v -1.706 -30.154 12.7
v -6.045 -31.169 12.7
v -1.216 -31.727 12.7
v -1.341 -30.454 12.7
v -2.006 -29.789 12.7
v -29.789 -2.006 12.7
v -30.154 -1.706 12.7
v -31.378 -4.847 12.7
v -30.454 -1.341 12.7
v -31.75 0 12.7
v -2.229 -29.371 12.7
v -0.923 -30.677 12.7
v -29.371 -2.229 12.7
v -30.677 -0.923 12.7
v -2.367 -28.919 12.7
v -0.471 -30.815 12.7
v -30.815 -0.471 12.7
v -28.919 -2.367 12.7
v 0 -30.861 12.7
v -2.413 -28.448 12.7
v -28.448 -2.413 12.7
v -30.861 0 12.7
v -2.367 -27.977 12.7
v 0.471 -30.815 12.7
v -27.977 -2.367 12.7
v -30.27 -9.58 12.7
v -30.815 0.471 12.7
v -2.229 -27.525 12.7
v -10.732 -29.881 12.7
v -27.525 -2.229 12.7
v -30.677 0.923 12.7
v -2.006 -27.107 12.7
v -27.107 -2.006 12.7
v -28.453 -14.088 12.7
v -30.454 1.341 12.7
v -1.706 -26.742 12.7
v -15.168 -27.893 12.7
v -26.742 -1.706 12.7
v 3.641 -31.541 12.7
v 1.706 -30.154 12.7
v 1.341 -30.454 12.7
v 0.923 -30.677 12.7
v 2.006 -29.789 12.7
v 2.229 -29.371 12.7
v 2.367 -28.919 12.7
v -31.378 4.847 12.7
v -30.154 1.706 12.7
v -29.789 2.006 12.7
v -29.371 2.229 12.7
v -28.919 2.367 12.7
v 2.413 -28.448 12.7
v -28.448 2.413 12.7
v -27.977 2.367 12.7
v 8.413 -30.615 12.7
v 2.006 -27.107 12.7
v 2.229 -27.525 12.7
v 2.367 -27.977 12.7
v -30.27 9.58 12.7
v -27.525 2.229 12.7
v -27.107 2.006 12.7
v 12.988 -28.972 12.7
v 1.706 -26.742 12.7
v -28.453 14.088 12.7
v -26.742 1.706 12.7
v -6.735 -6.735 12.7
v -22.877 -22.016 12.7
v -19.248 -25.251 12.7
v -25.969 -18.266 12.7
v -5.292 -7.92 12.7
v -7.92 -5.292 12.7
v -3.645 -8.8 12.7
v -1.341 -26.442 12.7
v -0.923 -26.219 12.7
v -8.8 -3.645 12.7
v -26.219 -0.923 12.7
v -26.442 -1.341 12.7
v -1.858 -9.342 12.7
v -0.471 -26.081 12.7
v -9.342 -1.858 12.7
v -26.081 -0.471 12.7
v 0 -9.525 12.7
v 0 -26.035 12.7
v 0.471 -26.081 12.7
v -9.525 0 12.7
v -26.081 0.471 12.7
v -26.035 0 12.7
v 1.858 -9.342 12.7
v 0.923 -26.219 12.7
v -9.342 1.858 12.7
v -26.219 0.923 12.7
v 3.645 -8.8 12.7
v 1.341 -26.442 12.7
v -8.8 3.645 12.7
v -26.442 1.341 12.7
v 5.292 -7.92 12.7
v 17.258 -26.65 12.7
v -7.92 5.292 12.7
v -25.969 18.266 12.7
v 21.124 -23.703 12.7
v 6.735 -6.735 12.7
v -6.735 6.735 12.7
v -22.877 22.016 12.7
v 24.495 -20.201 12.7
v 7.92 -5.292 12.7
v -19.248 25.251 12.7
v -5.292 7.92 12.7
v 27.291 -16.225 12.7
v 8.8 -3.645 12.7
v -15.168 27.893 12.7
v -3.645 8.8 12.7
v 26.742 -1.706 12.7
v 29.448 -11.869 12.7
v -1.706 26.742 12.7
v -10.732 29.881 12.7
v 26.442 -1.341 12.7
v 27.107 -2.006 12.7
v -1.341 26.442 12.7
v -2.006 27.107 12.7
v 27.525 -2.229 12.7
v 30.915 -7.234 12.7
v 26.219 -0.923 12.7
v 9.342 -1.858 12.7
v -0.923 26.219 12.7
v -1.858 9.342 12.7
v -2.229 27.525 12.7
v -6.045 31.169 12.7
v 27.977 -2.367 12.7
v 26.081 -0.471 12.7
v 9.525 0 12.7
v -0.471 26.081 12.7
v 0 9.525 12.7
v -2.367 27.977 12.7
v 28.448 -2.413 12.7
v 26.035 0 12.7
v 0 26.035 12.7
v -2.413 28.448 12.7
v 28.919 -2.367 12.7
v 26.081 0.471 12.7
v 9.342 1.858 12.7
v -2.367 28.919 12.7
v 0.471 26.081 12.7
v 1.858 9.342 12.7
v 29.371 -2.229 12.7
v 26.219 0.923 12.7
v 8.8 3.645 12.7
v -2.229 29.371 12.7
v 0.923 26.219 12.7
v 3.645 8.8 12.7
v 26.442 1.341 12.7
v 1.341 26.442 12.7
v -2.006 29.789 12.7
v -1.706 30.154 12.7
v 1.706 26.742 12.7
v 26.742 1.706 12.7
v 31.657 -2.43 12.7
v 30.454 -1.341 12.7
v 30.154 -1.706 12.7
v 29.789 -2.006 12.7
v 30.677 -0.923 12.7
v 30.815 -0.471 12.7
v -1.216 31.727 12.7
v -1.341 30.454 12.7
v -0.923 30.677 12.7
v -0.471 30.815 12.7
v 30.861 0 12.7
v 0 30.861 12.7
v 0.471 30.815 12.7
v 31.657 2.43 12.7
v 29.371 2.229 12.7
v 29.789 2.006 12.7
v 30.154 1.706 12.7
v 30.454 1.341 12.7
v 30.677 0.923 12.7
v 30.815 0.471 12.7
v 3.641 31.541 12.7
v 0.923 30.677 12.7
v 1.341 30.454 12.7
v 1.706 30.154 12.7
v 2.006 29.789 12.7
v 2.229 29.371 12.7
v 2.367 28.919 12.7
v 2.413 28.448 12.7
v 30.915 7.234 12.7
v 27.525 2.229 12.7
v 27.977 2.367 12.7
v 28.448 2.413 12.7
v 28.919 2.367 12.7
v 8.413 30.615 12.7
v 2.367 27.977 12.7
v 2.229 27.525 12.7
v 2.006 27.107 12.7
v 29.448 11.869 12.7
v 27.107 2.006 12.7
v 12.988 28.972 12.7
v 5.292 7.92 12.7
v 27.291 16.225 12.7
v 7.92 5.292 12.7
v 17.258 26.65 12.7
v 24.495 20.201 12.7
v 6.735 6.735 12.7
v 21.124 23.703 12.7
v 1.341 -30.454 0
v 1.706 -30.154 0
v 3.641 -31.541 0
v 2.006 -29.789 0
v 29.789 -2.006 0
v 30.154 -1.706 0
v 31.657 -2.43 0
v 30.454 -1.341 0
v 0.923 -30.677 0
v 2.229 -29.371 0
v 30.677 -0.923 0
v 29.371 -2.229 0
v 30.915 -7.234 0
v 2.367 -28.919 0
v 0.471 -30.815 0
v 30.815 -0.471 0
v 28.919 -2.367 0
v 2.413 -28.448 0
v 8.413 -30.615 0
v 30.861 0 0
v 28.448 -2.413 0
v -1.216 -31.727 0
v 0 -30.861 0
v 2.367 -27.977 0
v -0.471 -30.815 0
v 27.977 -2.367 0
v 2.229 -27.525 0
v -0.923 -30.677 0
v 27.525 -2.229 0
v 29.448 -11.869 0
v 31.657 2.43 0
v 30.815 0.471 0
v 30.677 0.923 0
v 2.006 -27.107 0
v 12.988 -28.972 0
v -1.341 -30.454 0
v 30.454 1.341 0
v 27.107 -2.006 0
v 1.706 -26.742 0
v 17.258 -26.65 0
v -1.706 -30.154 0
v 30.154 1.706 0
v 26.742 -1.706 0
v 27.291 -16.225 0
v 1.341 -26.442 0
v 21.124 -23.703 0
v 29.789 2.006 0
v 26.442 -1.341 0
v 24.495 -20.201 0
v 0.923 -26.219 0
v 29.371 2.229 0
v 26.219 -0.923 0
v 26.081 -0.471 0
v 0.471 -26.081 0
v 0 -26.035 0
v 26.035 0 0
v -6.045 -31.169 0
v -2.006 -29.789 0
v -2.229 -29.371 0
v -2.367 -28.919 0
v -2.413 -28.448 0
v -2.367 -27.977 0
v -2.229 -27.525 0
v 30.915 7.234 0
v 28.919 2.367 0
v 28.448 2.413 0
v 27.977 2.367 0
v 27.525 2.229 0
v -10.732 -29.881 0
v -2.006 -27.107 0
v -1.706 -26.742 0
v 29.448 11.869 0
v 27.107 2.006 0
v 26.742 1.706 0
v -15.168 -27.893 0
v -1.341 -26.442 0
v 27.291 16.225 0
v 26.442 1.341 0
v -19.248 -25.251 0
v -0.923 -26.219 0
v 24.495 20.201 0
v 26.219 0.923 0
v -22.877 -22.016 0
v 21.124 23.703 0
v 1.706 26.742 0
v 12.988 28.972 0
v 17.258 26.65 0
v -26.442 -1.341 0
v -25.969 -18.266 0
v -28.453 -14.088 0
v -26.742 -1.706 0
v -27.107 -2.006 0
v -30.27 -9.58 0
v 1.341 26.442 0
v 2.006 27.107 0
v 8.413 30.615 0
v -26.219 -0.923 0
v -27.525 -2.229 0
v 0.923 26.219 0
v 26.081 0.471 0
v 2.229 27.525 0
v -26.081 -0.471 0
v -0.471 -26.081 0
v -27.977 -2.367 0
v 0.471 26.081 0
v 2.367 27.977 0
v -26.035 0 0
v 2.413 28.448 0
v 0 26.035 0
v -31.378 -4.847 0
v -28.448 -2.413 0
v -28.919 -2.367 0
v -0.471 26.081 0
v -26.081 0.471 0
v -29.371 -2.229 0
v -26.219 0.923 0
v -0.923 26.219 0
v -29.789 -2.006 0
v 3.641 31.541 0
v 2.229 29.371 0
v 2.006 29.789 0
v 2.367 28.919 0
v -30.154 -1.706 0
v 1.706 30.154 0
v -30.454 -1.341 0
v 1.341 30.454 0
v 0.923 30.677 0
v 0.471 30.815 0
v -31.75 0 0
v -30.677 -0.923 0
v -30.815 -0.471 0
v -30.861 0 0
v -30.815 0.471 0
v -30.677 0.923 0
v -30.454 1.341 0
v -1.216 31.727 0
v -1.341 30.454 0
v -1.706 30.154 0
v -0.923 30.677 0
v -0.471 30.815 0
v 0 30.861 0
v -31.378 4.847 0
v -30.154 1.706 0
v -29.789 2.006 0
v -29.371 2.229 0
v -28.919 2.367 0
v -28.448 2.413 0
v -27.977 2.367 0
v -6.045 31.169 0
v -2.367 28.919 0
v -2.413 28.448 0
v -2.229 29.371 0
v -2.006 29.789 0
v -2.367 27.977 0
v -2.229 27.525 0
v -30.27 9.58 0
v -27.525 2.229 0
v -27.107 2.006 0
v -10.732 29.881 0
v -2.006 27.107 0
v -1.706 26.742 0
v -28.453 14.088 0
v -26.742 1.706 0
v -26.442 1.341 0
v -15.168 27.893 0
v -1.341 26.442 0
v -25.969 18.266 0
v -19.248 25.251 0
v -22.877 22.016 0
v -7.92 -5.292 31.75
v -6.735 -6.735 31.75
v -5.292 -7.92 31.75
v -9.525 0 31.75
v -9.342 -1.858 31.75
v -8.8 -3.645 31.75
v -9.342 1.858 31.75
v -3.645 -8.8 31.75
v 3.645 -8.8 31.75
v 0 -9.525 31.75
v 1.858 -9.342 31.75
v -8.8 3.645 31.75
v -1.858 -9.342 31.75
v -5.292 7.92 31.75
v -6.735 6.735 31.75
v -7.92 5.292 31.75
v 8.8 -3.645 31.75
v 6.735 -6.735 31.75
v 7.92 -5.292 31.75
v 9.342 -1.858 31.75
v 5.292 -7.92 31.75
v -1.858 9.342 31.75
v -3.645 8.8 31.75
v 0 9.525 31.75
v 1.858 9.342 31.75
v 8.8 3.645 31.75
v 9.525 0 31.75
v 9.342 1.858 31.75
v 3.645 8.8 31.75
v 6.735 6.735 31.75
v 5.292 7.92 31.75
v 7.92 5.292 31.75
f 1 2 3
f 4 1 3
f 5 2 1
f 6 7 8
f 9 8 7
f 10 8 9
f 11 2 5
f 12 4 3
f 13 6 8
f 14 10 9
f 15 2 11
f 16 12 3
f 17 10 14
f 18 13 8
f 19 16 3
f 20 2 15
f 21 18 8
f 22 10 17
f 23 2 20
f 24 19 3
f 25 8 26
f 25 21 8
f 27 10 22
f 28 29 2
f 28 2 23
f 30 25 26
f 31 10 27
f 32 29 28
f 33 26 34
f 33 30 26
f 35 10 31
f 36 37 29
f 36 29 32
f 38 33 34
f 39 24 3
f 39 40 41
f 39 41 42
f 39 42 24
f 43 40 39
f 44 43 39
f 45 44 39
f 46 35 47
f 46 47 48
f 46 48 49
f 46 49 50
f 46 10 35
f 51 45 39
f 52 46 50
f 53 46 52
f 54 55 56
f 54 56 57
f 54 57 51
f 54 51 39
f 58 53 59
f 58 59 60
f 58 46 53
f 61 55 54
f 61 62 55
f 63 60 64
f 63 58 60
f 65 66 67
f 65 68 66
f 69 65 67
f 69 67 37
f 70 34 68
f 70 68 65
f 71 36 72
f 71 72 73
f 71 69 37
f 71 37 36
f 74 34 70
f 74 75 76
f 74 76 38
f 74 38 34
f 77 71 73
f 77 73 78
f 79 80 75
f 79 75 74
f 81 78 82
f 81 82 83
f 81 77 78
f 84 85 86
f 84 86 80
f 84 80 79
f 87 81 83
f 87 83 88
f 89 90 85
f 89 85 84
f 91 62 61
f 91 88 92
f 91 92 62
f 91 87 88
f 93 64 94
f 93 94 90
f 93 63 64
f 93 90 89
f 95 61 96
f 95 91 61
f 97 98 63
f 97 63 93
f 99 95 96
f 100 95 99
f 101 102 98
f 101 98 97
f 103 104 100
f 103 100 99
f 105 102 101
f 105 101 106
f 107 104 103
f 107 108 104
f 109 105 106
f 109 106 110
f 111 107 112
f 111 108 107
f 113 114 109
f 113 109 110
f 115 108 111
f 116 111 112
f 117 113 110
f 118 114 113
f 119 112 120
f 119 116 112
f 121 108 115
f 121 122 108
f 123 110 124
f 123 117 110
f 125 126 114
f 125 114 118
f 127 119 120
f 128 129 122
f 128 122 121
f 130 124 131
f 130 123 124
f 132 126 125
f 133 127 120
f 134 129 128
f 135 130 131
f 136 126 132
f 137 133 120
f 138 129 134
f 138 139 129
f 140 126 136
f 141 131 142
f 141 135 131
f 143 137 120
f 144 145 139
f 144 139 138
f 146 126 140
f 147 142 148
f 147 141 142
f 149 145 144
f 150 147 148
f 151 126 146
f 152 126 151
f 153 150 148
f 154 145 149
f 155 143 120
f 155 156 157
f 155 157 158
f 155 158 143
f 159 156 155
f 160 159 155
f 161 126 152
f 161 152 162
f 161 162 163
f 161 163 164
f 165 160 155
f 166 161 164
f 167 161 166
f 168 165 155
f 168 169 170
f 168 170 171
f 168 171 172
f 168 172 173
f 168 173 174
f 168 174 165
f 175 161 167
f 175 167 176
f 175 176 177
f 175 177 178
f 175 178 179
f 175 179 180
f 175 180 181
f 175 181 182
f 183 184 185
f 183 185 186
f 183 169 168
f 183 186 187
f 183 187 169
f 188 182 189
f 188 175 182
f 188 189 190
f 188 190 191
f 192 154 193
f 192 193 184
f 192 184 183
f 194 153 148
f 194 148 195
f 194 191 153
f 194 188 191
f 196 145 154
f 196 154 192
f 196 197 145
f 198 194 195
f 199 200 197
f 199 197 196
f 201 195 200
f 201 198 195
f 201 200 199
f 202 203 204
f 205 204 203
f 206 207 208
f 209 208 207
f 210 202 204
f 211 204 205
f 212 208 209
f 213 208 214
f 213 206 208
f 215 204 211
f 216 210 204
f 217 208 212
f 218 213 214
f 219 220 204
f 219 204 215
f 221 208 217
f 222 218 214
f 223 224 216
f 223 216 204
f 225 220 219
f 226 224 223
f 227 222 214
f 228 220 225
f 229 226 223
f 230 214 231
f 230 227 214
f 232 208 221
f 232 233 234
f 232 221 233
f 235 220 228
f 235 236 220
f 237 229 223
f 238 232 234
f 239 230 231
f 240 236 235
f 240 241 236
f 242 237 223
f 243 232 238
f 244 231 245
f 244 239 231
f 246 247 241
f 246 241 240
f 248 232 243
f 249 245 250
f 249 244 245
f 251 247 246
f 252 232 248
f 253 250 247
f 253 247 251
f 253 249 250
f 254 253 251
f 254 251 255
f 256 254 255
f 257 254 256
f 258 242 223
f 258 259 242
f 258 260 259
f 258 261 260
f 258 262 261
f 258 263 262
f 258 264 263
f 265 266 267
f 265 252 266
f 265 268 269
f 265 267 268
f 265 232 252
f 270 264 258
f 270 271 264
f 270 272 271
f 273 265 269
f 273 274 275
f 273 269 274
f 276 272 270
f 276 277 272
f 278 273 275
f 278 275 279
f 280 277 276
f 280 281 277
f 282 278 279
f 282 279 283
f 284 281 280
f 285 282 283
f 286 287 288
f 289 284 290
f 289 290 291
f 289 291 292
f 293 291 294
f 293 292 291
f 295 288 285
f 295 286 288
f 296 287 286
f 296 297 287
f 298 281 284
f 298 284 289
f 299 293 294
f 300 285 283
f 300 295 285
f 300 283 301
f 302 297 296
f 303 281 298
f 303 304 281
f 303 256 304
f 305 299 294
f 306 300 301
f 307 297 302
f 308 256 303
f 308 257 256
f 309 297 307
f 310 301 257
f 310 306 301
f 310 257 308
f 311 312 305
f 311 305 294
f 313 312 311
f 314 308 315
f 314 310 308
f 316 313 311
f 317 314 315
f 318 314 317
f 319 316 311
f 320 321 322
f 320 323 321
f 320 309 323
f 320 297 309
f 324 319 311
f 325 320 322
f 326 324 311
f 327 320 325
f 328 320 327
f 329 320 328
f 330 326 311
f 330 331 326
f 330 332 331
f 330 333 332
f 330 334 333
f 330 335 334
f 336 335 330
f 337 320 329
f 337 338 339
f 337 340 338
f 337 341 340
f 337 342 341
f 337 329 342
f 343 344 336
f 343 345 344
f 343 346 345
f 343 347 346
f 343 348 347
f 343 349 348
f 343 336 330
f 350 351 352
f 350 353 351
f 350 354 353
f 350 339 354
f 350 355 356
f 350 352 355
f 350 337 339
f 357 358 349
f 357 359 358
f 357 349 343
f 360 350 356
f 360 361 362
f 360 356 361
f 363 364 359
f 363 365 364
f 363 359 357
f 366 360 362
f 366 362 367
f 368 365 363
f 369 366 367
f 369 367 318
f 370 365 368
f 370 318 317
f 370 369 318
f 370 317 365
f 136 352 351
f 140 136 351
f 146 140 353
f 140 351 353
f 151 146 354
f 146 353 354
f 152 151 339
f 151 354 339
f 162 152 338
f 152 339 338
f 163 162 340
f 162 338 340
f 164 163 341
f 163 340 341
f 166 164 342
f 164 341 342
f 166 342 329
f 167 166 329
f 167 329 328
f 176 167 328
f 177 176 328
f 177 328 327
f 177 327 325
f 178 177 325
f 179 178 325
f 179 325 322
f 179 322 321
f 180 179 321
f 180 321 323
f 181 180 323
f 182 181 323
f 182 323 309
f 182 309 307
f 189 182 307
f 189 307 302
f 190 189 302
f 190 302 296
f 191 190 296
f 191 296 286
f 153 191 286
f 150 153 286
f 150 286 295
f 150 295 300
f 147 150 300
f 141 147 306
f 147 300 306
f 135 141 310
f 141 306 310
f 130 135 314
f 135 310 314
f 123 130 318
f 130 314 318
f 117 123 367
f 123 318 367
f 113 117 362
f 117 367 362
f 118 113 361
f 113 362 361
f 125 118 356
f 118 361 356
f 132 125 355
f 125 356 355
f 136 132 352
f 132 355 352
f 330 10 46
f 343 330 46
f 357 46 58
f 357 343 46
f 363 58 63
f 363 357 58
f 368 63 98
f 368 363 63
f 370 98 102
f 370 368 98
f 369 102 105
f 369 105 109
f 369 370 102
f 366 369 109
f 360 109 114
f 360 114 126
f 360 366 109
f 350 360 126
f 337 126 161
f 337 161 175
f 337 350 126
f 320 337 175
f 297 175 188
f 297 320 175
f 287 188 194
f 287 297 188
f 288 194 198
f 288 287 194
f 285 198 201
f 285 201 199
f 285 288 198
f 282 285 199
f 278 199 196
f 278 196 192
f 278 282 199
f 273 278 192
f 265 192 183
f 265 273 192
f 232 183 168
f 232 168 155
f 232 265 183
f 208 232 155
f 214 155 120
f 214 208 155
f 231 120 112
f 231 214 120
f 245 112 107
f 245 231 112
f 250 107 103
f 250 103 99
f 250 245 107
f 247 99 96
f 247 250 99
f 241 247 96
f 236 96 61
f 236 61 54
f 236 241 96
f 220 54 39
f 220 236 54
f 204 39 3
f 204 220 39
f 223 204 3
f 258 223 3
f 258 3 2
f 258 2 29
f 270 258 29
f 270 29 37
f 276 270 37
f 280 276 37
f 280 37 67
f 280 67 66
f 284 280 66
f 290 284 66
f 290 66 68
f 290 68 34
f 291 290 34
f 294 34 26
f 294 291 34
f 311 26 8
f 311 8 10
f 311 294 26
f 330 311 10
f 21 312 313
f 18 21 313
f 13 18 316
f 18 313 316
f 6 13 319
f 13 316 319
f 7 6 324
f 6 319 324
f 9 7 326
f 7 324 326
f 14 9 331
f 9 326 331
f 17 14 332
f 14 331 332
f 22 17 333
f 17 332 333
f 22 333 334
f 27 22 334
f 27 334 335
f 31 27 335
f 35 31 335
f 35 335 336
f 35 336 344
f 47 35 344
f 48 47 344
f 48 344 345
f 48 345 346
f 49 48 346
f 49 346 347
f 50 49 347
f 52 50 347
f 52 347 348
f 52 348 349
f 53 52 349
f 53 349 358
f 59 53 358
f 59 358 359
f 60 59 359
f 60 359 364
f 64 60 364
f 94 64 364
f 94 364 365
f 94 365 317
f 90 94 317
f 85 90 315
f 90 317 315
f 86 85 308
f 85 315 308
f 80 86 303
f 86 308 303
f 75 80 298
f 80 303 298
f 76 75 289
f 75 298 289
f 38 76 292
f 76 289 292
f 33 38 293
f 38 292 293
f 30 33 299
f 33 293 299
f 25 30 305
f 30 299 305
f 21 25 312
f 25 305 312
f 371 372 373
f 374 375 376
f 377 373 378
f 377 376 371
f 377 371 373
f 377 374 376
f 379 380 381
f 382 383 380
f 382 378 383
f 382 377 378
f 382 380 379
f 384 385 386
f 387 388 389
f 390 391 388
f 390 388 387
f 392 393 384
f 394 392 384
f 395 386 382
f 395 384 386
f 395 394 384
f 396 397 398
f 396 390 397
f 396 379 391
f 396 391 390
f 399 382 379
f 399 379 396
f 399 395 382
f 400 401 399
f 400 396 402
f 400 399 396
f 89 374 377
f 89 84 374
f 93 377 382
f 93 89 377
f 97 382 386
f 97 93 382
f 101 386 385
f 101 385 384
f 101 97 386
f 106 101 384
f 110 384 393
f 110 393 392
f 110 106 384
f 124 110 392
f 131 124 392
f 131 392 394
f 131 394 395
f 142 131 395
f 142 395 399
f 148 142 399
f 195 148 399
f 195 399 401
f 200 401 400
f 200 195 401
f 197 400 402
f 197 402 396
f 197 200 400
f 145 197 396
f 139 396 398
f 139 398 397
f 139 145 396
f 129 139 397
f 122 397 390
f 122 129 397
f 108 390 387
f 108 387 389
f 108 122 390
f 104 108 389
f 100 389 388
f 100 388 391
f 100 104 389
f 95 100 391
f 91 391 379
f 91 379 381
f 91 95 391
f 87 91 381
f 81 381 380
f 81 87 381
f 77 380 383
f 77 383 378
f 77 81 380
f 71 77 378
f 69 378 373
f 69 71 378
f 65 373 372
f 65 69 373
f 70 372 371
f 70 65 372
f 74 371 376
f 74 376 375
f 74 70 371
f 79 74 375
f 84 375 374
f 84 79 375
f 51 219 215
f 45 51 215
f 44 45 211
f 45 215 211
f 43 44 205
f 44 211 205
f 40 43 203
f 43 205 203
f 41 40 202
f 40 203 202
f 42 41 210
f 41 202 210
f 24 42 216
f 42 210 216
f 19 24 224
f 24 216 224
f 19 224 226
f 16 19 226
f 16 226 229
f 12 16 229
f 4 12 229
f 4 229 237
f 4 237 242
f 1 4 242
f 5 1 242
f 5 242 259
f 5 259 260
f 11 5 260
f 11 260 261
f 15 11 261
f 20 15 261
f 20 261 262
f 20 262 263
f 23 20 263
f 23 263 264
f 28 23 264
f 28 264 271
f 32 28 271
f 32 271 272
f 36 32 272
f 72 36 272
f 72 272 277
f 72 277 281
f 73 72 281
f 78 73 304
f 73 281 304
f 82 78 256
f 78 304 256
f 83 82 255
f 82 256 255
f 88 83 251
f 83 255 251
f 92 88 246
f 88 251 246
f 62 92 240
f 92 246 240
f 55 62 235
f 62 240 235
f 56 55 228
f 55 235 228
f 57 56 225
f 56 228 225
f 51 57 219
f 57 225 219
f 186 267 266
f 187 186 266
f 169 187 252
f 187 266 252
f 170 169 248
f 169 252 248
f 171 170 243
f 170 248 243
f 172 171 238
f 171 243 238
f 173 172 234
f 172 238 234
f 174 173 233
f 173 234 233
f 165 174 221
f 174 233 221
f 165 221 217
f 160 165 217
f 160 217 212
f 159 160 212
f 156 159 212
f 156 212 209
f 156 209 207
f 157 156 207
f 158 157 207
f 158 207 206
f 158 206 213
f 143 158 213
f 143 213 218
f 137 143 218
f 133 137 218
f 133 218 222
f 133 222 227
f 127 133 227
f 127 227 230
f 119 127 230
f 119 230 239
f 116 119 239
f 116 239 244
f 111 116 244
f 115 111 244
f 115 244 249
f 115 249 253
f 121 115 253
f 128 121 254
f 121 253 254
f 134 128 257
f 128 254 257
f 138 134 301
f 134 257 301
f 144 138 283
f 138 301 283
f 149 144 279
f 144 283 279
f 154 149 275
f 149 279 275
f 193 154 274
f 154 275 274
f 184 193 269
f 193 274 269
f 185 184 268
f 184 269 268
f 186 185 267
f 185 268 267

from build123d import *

# Parameters (mm, degrees)
F3_D            = 4.826
F3_COPIES_COUNT = 4


# Not quite as in the source:
# - a pattern or mirror of a feature is missing from the dataset's text; its kind, count and spacing are read off the source's solid


with BuildPart() as f1:
    # F0 (on Front) → F1 (revolve)
    with BuildSketch(Plane.XZ):
        Polygon((-31.75, 0), (0, 0), (0, 31.75), (-9.525, 31.75), (-9.525, 12.7), (-31.75, 12.7), align=None)
    revolve(axis=Axis((0, 0, 15.875), (0, 0, -1)))

    # F3 (through all)
    with Locations(Plane.XY.offset(12.7)):
        with Locations((0, 28.448)):
            f3 = Hole(F3_D / 2)

    # F3_copies: F3 ×4 about axis
    f3_copies_axis = Axis((0, 0, 0), (0, 0, 1))
    for i in range(1, F3_COPIES_COUNT):
        add(f3.rotate(f3_copies_axis, i * 360 / F3_COPIES_COUNT), mode=Mode.SUBTRACT)


solid = f1.part
